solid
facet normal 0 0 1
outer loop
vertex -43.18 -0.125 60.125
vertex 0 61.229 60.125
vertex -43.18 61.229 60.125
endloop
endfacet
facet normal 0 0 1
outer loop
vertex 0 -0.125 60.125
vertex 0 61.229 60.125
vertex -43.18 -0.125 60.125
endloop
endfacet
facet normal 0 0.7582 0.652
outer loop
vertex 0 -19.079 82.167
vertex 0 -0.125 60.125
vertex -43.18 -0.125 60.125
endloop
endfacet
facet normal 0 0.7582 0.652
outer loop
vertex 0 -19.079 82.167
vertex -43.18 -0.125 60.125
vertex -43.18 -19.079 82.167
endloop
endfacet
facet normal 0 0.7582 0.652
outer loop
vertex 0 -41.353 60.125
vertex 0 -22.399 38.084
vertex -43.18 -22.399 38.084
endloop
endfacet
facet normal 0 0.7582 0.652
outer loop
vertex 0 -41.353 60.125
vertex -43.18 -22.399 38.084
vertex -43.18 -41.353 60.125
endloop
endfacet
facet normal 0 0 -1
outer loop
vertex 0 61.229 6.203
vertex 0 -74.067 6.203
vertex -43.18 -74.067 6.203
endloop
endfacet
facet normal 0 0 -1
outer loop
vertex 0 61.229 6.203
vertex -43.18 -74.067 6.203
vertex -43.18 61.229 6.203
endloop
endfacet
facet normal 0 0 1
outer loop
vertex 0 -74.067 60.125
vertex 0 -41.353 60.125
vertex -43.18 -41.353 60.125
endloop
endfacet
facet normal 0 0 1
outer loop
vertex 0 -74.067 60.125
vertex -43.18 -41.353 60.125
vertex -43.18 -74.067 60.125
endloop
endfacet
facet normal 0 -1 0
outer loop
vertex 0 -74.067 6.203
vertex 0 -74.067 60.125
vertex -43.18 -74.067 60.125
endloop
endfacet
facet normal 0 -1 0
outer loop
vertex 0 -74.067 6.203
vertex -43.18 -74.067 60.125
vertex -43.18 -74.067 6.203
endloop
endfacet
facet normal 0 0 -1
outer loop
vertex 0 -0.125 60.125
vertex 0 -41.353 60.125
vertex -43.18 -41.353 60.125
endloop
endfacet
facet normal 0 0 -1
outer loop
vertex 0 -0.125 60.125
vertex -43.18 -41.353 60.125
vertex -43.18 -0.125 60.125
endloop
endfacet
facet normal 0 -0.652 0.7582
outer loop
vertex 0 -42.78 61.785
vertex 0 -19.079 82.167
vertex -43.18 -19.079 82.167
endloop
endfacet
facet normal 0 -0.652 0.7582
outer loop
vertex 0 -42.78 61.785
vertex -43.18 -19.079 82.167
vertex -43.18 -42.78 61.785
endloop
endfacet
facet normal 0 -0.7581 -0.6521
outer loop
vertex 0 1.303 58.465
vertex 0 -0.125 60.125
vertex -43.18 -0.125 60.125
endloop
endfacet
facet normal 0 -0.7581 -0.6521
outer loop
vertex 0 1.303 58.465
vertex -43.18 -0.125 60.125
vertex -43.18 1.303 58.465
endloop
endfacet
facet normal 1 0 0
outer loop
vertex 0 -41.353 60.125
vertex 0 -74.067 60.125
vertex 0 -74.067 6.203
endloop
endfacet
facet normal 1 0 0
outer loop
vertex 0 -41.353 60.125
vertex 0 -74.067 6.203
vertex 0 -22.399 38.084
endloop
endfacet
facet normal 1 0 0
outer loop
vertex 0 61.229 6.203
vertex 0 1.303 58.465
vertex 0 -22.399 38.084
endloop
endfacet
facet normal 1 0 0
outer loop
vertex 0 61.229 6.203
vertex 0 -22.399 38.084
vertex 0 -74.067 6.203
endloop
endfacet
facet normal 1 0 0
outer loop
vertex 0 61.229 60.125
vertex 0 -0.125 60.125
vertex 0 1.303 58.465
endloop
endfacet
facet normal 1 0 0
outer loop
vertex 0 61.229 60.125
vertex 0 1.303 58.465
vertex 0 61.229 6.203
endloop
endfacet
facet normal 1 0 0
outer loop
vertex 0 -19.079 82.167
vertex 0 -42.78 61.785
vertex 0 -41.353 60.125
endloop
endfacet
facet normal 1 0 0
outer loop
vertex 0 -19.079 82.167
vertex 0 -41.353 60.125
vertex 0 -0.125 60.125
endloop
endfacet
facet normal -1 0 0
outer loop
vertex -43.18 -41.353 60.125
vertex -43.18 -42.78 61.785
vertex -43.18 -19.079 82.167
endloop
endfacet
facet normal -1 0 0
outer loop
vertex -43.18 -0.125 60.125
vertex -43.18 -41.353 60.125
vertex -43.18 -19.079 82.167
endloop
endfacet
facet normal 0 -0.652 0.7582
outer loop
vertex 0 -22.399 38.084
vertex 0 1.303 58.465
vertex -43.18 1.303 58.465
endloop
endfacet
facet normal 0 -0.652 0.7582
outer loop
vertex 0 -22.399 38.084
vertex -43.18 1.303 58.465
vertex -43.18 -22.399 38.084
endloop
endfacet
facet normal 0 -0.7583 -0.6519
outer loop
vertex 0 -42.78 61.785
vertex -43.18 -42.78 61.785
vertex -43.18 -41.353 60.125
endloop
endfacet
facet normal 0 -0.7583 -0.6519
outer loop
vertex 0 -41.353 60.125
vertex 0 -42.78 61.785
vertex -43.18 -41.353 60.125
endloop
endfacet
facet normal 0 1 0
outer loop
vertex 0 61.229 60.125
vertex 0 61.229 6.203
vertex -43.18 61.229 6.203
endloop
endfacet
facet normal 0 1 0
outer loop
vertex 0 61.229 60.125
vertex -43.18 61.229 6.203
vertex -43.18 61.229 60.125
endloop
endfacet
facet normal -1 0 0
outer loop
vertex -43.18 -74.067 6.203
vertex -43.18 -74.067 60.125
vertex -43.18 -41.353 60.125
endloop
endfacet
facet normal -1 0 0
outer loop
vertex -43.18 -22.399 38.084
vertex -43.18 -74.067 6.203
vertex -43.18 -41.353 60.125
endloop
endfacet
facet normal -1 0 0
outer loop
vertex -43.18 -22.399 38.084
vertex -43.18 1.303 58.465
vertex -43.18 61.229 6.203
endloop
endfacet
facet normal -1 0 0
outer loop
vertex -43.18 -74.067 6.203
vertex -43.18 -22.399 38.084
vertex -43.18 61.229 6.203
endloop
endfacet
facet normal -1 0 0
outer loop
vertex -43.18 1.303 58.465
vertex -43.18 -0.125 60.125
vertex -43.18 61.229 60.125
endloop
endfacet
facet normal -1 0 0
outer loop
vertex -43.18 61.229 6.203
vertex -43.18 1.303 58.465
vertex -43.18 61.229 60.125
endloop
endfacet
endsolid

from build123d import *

# Parameters (mm, degrees)
F1_DEPTH = 43.18


with BuildPart() as f1:
    # F0 (on Right) → F1 (new body)
    with BuildSketch(Plane.YZ):
        Polygon((-41.352519, 60.125191), (-74.066862, 60.125191), (-74.066862, 6.202942), (61.228603, 6.202942), (61.228603, 60.125191), (-0.124912, 60.125191), (1.302615, 58.465118), (-22.398788, 38.083861), align=None)
        Polygon((-42.780045, 61.785264), (-41.352519, 60.125191), (-20.738715, 60.125191), (-0.124912, 60.125191), (-19.078642, 82.166521), align=None)
    extrude(amount=-F1_DEPTH)


solid = f1.part
